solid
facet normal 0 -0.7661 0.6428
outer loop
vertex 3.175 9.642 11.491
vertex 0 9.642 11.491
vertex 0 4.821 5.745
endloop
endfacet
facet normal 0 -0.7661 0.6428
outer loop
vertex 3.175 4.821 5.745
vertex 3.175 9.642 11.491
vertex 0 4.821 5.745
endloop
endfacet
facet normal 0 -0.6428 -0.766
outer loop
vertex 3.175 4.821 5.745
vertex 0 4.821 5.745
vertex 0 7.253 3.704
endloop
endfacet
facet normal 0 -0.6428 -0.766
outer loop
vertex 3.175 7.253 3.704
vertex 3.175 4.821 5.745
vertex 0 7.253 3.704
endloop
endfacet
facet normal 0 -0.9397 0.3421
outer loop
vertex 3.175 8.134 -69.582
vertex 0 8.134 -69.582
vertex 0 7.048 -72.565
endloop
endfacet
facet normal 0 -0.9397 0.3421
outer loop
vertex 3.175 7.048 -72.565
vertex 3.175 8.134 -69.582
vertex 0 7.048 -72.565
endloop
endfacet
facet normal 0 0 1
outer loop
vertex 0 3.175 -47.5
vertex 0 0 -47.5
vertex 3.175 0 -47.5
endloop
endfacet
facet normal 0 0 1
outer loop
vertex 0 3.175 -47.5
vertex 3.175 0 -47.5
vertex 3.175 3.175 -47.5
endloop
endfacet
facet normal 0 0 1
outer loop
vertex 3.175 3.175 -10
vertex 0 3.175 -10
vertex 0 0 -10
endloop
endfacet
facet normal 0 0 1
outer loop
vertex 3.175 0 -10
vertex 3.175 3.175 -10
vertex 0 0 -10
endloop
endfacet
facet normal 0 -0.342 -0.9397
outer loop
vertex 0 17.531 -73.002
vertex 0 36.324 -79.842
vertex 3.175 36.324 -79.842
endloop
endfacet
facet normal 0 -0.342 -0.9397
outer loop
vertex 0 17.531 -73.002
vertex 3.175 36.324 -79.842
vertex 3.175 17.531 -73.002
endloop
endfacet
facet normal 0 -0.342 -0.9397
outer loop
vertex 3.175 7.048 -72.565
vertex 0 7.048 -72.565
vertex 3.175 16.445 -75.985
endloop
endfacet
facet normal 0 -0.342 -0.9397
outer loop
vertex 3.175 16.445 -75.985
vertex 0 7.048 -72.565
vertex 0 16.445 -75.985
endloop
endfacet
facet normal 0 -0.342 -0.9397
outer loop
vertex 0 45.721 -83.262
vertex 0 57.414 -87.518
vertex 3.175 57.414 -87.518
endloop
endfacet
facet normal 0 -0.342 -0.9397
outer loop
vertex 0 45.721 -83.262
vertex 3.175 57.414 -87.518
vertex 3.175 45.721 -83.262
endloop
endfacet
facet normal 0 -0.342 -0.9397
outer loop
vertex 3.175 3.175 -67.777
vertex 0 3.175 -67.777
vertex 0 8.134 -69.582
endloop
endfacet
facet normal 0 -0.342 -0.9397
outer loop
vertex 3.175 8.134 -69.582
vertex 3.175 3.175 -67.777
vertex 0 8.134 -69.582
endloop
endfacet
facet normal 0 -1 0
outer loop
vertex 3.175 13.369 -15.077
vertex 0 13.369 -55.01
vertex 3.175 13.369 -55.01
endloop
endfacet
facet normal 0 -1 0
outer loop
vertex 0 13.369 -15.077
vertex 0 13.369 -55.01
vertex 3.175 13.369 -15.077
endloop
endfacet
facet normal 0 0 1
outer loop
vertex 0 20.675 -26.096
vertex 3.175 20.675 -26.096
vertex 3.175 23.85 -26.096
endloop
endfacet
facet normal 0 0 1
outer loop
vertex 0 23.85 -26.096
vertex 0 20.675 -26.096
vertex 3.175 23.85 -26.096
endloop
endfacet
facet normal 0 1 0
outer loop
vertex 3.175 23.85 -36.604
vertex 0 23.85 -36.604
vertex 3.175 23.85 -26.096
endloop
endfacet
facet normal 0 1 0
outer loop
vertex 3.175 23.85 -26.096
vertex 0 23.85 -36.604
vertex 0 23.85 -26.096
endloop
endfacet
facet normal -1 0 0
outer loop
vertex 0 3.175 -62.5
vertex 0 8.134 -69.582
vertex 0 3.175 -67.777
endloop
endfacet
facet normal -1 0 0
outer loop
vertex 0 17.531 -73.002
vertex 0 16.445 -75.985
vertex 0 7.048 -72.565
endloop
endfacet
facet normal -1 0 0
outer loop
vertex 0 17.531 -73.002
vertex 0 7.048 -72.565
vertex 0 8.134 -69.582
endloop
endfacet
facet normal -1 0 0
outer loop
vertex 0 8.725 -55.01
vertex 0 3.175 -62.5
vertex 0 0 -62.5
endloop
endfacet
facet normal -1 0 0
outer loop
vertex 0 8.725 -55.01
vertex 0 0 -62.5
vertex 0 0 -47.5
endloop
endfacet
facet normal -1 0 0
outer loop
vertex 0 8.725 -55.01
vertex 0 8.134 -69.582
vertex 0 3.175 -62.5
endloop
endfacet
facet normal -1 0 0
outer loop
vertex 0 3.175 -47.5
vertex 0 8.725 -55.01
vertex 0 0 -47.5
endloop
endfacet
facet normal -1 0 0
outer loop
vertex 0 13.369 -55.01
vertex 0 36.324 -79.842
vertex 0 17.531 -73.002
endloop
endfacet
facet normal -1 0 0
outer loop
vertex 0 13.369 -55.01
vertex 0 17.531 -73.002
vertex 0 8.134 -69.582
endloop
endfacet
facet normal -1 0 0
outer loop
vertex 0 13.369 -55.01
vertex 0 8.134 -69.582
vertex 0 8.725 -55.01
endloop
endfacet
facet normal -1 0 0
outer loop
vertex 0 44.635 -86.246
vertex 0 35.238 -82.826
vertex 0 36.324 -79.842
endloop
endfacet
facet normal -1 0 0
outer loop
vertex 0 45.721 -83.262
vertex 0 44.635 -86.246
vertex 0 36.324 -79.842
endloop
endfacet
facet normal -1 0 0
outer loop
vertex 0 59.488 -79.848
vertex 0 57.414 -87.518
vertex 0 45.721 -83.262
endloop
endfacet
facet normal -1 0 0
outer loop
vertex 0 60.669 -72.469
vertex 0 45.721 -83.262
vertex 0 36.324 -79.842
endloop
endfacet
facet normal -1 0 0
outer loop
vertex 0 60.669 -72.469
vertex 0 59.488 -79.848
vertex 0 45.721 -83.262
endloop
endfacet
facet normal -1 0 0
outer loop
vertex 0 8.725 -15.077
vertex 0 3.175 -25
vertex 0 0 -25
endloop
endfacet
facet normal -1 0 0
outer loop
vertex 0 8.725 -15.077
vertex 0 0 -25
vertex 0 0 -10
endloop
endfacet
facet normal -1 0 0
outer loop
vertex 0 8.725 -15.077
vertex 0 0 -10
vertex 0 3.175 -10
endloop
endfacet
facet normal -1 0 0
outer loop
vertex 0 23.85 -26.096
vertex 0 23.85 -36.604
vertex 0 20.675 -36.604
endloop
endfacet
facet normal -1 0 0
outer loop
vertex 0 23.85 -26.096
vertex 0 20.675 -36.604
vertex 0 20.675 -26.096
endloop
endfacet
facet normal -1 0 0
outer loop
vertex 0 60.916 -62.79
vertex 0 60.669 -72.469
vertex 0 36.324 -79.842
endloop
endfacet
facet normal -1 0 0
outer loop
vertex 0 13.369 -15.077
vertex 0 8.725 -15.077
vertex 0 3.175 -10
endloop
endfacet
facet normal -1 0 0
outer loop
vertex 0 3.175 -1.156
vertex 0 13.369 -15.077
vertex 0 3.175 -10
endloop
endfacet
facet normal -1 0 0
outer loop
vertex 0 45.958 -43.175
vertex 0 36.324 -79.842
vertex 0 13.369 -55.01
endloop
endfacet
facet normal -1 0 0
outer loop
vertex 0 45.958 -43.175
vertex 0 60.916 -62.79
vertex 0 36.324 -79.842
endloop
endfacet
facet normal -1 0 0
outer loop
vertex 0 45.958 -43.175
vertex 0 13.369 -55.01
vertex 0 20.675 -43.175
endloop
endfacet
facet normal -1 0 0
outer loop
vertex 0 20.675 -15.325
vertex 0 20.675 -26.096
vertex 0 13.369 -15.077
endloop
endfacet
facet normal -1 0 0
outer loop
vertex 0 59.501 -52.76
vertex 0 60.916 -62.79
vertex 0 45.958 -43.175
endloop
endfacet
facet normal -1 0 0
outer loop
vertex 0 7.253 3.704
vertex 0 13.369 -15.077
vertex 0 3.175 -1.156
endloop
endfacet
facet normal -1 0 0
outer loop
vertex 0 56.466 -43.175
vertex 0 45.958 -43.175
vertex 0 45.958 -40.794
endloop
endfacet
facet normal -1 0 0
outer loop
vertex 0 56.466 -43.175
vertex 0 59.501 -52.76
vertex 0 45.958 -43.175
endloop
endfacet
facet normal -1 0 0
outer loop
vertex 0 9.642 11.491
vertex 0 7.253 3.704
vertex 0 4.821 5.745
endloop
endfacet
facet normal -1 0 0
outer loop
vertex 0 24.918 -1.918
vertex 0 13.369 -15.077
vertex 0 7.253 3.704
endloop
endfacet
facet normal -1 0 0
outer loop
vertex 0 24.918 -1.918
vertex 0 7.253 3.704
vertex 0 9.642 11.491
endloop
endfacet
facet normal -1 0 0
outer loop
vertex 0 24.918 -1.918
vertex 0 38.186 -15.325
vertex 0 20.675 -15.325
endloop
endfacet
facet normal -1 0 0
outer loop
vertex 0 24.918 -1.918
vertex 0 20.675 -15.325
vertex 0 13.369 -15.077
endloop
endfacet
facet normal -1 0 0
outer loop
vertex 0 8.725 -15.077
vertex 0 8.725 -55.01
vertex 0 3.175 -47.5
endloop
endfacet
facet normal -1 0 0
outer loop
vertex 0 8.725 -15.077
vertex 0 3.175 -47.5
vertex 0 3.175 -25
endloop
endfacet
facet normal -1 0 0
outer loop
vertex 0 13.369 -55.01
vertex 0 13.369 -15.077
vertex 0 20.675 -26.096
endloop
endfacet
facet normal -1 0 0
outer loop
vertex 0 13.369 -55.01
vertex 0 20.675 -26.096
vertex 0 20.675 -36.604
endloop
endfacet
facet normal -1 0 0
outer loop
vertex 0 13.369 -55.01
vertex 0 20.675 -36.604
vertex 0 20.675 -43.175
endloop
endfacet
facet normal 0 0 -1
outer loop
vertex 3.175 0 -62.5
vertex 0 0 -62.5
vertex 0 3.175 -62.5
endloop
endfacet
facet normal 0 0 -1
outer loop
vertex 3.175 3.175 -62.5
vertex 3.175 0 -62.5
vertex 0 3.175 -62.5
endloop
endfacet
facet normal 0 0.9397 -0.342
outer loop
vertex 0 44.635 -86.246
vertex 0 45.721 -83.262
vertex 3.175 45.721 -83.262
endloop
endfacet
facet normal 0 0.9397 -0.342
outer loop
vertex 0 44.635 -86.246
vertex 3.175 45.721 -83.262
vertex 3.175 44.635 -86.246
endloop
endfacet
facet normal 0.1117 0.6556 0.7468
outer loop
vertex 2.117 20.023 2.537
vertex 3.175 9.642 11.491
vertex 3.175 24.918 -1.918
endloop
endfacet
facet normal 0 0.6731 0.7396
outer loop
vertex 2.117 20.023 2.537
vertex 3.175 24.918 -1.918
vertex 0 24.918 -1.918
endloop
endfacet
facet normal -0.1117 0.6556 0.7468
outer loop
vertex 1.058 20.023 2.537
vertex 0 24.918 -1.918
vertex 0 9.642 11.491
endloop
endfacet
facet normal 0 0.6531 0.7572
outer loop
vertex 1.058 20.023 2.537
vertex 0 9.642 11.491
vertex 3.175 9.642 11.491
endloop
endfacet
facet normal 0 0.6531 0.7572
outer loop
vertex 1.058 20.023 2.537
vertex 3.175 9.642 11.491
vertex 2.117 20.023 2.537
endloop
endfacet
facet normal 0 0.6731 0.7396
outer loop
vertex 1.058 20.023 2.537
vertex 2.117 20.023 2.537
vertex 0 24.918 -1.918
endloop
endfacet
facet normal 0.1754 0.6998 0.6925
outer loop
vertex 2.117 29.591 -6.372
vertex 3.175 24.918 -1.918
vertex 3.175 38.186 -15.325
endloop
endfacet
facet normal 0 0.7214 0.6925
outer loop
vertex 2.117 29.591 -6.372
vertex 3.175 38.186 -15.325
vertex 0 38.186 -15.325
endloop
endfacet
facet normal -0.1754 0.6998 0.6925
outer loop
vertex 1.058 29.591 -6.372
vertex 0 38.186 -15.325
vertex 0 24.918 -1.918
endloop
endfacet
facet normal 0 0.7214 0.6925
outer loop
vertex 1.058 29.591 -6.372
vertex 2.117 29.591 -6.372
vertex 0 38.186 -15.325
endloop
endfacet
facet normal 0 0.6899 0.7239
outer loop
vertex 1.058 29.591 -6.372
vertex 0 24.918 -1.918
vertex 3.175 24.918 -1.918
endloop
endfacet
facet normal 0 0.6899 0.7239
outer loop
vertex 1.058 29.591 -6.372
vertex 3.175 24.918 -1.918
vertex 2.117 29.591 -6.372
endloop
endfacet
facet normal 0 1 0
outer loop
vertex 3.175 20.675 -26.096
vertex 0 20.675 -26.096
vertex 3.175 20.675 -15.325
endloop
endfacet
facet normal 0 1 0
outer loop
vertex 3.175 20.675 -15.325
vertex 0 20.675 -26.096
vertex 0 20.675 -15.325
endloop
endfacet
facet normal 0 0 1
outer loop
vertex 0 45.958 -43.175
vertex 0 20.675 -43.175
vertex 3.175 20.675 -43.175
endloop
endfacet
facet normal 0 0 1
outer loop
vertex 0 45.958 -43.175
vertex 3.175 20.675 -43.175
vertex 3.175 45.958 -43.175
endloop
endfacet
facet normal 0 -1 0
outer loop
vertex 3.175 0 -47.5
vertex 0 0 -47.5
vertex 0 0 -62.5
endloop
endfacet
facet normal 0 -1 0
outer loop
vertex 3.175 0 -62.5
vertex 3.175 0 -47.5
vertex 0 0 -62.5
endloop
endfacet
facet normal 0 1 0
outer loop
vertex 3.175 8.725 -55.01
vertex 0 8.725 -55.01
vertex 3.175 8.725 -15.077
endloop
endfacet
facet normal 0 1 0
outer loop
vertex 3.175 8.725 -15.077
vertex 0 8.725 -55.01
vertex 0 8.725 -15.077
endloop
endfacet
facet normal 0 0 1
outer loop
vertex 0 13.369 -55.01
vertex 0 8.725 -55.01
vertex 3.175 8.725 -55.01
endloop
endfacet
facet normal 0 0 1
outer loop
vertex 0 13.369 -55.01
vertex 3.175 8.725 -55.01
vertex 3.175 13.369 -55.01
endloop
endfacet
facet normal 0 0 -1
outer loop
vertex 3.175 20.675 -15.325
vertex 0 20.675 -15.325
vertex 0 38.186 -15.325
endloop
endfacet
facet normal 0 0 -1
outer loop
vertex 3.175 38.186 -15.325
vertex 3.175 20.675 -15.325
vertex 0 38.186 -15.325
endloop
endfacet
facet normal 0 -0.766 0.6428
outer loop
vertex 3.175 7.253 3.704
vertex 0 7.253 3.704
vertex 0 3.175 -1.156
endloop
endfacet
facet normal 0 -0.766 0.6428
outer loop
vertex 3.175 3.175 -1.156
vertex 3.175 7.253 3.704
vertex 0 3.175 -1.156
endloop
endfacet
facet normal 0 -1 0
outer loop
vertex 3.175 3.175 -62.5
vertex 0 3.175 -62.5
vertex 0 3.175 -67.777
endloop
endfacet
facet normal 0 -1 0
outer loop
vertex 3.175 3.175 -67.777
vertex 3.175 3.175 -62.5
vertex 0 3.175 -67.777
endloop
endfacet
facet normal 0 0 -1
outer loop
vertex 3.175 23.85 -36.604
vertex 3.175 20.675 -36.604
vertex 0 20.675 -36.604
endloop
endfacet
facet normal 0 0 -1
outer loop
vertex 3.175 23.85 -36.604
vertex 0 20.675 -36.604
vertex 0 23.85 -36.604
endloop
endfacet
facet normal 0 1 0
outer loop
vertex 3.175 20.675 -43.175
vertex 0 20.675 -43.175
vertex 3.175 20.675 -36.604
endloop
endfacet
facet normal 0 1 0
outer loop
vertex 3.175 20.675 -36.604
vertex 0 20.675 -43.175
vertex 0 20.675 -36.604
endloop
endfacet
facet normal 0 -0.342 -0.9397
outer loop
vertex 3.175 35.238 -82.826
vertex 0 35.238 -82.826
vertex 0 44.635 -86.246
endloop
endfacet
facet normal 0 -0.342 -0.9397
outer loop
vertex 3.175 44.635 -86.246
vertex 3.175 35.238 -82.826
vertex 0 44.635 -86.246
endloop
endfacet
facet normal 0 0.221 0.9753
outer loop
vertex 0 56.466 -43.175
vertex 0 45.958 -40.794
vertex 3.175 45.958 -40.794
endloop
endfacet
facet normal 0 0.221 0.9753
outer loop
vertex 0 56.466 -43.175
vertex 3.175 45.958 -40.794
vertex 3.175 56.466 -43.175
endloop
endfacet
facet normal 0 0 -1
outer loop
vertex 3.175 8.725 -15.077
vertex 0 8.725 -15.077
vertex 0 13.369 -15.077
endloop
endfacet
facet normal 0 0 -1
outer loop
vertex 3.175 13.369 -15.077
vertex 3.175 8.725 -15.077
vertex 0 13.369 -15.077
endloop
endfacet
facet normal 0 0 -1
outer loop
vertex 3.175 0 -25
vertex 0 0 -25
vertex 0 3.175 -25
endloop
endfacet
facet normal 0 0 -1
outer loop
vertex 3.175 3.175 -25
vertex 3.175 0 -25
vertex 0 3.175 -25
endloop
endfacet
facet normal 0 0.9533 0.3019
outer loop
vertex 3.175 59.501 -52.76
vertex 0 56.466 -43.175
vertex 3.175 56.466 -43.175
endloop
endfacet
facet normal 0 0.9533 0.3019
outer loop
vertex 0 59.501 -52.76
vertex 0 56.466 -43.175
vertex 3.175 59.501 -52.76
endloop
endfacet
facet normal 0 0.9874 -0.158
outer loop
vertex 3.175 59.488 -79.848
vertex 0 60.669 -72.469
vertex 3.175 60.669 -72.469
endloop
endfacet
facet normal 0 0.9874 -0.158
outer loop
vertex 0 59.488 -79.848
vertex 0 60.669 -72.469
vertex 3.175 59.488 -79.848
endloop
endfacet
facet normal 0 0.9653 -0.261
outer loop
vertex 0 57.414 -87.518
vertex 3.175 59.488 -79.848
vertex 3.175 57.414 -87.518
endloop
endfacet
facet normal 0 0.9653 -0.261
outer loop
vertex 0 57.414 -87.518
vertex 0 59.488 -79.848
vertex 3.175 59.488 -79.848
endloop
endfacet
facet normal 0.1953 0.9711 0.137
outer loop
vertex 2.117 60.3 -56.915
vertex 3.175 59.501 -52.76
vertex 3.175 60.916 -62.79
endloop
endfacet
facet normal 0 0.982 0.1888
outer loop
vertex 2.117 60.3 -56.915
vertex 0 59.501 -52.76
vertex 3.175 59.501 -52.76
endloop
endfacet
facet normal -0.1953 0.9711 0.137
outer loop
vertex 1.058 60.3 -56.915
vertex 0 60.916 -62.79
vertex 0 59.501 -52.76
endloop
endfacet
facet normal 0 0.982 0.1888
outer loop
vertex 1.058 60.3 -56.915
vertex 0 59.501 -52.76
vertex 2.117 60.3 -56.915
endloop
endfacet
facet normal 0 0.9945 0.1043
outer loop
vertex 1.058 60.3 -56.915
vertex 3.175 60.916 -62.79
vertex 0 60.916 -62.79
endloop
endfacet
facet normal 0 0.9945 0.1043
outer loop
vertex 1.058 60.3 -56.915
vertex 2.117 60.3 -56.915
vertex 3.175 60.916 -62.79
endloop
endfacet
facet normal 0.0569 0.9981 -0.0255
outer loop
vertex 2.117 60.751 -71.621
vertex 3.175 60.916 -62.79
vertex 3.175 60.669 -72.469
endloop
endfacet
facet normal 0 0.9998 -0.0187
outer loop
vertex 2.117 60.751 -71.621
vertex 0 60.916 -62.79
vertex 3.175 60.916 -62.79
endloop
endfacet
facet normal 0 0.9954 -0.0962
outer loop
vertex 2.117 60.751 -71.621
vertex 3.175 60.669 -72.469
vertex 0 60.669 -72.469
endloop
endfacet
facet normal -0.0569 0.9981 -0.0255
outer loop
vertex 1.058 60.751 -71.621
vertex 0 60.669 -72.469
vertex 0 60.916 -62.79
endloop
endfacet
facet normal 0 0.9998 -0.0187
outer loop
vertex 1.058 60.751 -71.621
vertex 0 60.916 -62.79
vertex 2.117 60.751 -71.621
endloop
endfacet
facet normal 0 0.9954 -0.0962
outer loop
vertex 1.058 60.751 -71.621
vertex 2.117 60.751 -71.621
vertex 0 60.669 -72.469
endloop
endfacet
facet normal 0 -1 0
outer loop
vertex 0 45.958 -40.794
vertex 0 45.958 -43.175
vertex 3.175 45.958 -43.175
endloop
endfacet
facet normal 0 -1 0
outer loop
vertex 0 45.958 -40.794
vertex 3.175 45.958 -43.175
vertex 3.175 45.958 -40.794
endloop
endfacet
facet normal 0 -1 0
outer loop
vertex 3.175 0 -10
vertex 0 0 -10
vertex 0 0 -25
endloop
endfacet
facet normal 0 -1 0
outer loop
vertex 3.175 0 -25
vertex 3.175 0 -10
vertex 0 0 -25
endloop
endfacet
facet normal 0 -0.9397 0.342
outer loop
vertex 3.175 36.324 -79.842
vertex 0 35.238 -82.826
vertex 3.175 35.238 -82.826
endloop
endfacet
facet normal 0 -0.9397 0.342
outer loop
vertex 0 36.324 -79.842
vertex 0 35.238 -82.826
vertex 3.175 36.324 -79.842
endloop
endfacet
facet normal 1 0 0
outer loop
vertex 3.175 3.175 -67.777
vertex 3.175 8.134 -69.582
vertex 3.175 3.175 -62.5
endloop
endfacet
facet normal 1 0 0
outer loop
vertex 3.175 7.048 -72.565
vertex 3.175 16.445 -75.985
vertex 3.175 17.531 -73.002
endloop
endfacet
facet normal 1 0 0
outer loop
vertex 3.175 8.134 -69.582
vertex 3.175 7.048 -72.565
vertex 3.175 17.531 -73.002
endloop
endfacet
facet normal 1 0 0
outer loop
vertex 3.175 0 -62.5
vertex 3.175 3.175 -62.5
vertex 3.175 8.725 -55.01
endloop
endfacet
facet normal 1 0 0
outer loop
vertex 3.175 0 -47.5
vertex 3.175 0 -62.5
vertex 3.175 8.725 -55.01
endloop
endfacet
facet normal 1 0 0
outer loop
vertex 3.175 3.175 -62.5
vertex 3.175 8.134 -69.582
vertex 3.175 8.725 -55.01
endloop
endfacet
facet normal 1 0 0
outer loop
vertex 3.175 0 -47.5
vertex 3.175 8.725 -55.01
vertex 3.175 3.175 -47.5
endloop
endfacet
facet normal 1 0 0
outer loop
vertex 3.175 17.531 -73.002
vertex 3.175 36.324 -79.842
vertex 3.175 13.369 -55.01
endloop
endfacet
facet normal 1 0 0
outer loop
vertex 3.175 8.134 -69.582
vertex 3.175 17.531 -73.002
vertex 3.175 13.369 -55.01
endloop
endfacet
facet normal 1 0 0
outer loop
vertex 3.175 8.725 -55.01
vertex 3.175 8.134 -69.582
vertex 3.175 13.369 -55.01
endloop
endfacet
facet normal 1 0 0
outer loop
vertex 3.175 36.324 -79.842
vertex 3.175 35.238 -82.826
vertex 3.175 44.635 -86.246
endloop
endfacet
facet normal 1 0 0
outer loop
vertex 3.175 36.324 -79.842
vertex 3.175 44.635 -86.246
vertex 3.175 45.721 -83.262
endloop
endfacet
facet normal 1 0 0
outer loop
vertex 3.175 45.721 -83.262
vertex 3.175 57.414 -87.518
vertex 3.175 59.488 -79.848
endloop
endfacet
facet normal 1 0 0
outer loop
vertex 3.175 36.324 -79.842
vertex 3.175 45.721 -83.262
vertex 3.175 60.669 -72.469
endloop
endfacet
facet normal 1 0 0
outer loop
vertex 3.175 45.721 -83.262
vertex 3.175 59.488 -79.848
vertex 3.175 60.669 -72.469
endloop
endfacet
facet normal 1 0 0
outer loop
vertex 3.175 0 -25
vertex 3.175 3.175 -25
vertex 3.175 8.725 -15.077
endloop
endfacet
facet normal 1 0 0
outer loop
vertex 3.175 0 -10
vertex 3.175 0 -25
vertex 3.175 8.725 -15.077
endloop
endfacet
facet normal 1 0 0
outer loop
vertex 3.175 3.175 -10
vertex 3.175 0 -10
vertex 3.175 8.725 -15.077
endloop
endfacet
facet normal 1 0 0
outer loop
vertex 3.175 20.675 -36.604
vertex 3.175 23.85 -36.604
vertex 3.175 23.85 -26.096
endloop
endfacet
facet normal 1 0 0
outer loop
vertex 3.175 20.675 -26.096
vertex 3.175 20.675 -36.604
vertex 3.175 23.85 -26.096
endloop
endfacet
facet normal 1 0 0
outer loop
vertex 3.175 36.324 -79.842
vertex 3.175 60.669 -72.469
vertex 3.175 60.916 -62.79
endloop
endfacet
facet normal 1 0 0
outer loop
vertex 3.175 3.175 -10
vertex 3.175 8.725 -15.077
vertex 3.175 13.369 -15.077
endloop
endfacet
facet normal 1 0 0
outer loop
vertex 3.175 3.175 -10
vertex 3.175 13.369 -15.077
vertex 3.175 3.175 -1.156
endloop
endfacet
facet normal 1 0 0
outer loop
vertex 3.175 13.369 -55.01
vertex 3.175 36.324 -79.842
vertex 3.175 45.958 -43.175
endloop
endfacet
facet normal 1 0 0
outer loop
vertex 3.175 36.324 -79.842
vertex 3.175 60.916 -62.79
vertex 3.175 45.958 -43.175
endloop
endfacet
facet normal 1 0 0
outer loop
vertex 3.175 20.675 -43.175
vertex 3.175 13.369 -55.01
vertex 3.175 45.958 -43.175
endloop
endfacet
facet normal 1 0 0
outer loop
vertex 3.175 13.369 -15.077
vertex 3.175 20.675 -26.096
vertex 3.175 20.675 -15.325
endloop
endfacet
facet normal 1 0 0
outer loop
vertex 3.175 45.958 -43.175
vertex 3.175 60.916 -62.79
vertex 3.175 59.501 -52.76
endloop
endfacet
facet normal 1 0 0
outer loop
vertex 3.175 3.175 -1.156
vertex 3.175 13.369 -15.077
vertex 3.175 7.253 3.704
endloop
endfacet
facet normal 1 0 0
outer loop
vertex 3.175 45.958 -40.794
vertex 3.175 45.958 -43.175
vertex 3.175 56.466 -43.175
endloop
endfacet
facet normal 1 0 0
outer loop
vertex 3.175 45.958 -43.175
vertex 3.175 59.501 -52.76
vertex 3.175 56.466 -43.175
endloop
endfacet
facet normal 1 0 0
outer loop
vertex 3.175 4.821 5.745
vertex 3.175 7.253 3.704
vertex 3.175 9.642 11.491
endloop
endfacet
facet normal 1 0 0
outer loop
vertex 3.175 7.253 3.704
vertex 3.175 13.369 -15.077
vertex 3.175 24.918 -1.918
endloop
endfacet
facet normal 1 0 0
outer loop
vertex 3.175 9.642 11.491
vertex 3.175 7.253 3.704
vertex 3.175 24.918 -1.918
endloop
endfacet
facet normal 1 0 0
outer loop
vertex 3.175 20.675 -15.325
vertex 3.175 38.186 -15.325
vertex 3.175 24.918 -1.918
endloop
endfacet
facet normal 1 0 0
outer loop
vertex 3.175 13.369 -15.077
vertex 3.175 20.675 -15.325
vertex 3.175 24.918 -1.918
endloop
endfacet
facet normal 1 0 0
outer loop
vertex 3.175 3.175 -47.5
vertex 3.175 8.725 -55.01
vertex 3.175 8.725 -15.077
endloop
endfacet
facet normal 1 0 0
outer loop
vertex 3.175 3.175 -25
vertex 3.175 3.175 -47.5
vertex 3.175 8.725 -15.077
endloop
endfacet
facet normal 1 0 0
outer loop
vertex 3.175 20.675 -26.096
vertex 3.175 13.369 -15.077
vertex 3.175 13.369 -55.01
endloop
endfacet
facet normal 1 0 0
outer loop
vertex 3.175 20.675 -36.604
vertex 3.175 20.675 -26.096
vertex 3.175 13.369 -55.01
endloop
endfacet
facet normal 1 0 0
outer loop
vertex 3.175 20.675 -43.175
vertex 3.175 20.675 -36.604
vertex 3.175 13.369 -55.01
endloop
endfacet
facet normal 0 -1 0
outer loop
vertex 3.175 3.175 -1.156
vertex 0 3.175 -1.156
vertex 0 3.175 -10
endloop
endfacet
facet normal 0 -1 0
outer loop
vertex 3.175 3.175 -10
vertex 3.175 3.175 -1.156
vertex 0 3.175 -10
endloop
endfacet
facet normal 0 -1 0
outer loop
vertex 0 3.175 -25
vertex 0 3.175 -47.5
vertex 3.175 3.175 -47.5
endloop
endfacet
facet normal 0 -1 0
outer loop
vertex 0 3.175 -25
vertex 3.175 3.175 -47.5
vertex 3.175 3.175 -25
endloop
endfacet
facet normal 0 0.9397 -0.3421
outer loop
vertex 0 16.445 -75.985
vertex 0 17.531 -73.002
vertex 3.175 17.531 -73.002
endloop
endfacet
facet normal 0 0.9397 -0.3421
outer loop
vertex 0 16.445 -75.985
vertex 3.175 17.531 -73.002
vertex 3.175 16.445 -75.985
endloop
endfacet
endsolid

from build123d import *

# Parameters (mm, degrees)
BOSS_EXTRUDE1_DEPTH = 3.175
SKETCH2_W           = 27.85
SKETCH2_H           = 35.791497658
CUT_EXTRUDE1_DEPTH  = 4.1750001
SKETCH3_W           = 10.508
SKETCH3_H           = 3.175
BOSS_EXTRUDE2_DEPTH = 3.175
SKETCH4_W           = 22.5
SKETCH4_H           = 3.175
CUT_EXTRUDE2_DEPTH  = 4.1750001
SKETCH5_W           = 39.932212354
SKETCH5_H           = 4.644211625
CUT_EXTRUDE3_DEPTH  = 10


with BuildPart() as part:
    # Sketch1 → Boss-Extrude1 (new body)
    with BuildSketch(Plane(origin=(0, 0, 0), x_dir=(0, 0, -1), z_dir=(1, 0, 0))):
        with BuildLine():
            Line((0, 0), (70, 0))
            Line((70, 0), (90.5212086, 56.381557247))
            add(Edge.make_bspline(
                [(-11.490666647, 9.641814145), (19.4560829, 46.522714097), (48.01605029, 71.852169675), (90.5212086, 56.381557247)],
                knots=[0, 0, 0, 0, 1, 1, 1, 1], degree=3))
            Line((-11.490666647, 9.641814145), (0, 0))
        make_face()
    extrude(amount=BOSS_EXTRUDE1_DEPTH)

    # Sketch2 → Cut-Extrude1 (cut, through all)
    with BuildSketch(Plane.ZY):
        with Locations((-29.25, 38.570748829)):
            Rectangle(SKETCH2_W, SKETCH2_H)
    extrude(amount=-CUT_EXTRUDE1_DEPTH, mode=Mode.SUBTRACT)

    # Sketch3 → Boss-Extrude2 (add)
    with BuildSketch(Plane.ZY):
        Polygon((-43.175, 56.466497658), (-43.175, 45.958497658), (-40.79375, 45.958497658), align=None)
        with Locations((-31.35, 22.2625)):
            Rectangle(SKETCH3_W, SKETCH3_H)
    extrude(amount=-BOSS_EXTRUDE2_DEPTH)

    # Sketch4 → Cut-Extrude2 (cut, through all)
    with BuildSketch(Plane.ZY):
        Polygon((-83.262432737, 45.721313442), (-86.245956808, 44.635399487), (-90.5212086, 56.381557247), (-87.537684529, 57.467471202), align=None)
        Polygon((-79.842231304, 36.324387235), (-73.001828437, 17.530534819), (-75.985352508, 16.444620864), (-82.825755375, 35.238473279), align=None)
        Polygon((-72.565151075, 7.047694656), (-70, 0), (-62.5, 0), (-62.5, 3.175), (-67.776841066, 3.175), (-69.581627004, 8.133608611), align=None)
        with Locations((-36.25, 1.5875)):
            Rectangle(SKETCH4_W, SKETCH4_H)
        Polygon((-10, 3.175), (-10, 0), (0, 0), (5.745333323, 4.820907073), (3.704482663, 7.25309818), (-1.155605494, 3.175), align=None)
    extrude(amount=-CUT_EXTRUDE2_DEPTH, mode=Mode.SUBTRACT)

    # Sketch5 → Cut-Extrude3 (cut)
    with BuildSketch(Plane.ZY):
        with Locations((-35.043485806, 11.047370883)):
            Rectangle(SKETCH5_W, SKETCH5_H)
    extrude(amount=-CUT_EXTRUDE3_DEPTH, mode=Mode.SUBTRACT)


solid = part.part
